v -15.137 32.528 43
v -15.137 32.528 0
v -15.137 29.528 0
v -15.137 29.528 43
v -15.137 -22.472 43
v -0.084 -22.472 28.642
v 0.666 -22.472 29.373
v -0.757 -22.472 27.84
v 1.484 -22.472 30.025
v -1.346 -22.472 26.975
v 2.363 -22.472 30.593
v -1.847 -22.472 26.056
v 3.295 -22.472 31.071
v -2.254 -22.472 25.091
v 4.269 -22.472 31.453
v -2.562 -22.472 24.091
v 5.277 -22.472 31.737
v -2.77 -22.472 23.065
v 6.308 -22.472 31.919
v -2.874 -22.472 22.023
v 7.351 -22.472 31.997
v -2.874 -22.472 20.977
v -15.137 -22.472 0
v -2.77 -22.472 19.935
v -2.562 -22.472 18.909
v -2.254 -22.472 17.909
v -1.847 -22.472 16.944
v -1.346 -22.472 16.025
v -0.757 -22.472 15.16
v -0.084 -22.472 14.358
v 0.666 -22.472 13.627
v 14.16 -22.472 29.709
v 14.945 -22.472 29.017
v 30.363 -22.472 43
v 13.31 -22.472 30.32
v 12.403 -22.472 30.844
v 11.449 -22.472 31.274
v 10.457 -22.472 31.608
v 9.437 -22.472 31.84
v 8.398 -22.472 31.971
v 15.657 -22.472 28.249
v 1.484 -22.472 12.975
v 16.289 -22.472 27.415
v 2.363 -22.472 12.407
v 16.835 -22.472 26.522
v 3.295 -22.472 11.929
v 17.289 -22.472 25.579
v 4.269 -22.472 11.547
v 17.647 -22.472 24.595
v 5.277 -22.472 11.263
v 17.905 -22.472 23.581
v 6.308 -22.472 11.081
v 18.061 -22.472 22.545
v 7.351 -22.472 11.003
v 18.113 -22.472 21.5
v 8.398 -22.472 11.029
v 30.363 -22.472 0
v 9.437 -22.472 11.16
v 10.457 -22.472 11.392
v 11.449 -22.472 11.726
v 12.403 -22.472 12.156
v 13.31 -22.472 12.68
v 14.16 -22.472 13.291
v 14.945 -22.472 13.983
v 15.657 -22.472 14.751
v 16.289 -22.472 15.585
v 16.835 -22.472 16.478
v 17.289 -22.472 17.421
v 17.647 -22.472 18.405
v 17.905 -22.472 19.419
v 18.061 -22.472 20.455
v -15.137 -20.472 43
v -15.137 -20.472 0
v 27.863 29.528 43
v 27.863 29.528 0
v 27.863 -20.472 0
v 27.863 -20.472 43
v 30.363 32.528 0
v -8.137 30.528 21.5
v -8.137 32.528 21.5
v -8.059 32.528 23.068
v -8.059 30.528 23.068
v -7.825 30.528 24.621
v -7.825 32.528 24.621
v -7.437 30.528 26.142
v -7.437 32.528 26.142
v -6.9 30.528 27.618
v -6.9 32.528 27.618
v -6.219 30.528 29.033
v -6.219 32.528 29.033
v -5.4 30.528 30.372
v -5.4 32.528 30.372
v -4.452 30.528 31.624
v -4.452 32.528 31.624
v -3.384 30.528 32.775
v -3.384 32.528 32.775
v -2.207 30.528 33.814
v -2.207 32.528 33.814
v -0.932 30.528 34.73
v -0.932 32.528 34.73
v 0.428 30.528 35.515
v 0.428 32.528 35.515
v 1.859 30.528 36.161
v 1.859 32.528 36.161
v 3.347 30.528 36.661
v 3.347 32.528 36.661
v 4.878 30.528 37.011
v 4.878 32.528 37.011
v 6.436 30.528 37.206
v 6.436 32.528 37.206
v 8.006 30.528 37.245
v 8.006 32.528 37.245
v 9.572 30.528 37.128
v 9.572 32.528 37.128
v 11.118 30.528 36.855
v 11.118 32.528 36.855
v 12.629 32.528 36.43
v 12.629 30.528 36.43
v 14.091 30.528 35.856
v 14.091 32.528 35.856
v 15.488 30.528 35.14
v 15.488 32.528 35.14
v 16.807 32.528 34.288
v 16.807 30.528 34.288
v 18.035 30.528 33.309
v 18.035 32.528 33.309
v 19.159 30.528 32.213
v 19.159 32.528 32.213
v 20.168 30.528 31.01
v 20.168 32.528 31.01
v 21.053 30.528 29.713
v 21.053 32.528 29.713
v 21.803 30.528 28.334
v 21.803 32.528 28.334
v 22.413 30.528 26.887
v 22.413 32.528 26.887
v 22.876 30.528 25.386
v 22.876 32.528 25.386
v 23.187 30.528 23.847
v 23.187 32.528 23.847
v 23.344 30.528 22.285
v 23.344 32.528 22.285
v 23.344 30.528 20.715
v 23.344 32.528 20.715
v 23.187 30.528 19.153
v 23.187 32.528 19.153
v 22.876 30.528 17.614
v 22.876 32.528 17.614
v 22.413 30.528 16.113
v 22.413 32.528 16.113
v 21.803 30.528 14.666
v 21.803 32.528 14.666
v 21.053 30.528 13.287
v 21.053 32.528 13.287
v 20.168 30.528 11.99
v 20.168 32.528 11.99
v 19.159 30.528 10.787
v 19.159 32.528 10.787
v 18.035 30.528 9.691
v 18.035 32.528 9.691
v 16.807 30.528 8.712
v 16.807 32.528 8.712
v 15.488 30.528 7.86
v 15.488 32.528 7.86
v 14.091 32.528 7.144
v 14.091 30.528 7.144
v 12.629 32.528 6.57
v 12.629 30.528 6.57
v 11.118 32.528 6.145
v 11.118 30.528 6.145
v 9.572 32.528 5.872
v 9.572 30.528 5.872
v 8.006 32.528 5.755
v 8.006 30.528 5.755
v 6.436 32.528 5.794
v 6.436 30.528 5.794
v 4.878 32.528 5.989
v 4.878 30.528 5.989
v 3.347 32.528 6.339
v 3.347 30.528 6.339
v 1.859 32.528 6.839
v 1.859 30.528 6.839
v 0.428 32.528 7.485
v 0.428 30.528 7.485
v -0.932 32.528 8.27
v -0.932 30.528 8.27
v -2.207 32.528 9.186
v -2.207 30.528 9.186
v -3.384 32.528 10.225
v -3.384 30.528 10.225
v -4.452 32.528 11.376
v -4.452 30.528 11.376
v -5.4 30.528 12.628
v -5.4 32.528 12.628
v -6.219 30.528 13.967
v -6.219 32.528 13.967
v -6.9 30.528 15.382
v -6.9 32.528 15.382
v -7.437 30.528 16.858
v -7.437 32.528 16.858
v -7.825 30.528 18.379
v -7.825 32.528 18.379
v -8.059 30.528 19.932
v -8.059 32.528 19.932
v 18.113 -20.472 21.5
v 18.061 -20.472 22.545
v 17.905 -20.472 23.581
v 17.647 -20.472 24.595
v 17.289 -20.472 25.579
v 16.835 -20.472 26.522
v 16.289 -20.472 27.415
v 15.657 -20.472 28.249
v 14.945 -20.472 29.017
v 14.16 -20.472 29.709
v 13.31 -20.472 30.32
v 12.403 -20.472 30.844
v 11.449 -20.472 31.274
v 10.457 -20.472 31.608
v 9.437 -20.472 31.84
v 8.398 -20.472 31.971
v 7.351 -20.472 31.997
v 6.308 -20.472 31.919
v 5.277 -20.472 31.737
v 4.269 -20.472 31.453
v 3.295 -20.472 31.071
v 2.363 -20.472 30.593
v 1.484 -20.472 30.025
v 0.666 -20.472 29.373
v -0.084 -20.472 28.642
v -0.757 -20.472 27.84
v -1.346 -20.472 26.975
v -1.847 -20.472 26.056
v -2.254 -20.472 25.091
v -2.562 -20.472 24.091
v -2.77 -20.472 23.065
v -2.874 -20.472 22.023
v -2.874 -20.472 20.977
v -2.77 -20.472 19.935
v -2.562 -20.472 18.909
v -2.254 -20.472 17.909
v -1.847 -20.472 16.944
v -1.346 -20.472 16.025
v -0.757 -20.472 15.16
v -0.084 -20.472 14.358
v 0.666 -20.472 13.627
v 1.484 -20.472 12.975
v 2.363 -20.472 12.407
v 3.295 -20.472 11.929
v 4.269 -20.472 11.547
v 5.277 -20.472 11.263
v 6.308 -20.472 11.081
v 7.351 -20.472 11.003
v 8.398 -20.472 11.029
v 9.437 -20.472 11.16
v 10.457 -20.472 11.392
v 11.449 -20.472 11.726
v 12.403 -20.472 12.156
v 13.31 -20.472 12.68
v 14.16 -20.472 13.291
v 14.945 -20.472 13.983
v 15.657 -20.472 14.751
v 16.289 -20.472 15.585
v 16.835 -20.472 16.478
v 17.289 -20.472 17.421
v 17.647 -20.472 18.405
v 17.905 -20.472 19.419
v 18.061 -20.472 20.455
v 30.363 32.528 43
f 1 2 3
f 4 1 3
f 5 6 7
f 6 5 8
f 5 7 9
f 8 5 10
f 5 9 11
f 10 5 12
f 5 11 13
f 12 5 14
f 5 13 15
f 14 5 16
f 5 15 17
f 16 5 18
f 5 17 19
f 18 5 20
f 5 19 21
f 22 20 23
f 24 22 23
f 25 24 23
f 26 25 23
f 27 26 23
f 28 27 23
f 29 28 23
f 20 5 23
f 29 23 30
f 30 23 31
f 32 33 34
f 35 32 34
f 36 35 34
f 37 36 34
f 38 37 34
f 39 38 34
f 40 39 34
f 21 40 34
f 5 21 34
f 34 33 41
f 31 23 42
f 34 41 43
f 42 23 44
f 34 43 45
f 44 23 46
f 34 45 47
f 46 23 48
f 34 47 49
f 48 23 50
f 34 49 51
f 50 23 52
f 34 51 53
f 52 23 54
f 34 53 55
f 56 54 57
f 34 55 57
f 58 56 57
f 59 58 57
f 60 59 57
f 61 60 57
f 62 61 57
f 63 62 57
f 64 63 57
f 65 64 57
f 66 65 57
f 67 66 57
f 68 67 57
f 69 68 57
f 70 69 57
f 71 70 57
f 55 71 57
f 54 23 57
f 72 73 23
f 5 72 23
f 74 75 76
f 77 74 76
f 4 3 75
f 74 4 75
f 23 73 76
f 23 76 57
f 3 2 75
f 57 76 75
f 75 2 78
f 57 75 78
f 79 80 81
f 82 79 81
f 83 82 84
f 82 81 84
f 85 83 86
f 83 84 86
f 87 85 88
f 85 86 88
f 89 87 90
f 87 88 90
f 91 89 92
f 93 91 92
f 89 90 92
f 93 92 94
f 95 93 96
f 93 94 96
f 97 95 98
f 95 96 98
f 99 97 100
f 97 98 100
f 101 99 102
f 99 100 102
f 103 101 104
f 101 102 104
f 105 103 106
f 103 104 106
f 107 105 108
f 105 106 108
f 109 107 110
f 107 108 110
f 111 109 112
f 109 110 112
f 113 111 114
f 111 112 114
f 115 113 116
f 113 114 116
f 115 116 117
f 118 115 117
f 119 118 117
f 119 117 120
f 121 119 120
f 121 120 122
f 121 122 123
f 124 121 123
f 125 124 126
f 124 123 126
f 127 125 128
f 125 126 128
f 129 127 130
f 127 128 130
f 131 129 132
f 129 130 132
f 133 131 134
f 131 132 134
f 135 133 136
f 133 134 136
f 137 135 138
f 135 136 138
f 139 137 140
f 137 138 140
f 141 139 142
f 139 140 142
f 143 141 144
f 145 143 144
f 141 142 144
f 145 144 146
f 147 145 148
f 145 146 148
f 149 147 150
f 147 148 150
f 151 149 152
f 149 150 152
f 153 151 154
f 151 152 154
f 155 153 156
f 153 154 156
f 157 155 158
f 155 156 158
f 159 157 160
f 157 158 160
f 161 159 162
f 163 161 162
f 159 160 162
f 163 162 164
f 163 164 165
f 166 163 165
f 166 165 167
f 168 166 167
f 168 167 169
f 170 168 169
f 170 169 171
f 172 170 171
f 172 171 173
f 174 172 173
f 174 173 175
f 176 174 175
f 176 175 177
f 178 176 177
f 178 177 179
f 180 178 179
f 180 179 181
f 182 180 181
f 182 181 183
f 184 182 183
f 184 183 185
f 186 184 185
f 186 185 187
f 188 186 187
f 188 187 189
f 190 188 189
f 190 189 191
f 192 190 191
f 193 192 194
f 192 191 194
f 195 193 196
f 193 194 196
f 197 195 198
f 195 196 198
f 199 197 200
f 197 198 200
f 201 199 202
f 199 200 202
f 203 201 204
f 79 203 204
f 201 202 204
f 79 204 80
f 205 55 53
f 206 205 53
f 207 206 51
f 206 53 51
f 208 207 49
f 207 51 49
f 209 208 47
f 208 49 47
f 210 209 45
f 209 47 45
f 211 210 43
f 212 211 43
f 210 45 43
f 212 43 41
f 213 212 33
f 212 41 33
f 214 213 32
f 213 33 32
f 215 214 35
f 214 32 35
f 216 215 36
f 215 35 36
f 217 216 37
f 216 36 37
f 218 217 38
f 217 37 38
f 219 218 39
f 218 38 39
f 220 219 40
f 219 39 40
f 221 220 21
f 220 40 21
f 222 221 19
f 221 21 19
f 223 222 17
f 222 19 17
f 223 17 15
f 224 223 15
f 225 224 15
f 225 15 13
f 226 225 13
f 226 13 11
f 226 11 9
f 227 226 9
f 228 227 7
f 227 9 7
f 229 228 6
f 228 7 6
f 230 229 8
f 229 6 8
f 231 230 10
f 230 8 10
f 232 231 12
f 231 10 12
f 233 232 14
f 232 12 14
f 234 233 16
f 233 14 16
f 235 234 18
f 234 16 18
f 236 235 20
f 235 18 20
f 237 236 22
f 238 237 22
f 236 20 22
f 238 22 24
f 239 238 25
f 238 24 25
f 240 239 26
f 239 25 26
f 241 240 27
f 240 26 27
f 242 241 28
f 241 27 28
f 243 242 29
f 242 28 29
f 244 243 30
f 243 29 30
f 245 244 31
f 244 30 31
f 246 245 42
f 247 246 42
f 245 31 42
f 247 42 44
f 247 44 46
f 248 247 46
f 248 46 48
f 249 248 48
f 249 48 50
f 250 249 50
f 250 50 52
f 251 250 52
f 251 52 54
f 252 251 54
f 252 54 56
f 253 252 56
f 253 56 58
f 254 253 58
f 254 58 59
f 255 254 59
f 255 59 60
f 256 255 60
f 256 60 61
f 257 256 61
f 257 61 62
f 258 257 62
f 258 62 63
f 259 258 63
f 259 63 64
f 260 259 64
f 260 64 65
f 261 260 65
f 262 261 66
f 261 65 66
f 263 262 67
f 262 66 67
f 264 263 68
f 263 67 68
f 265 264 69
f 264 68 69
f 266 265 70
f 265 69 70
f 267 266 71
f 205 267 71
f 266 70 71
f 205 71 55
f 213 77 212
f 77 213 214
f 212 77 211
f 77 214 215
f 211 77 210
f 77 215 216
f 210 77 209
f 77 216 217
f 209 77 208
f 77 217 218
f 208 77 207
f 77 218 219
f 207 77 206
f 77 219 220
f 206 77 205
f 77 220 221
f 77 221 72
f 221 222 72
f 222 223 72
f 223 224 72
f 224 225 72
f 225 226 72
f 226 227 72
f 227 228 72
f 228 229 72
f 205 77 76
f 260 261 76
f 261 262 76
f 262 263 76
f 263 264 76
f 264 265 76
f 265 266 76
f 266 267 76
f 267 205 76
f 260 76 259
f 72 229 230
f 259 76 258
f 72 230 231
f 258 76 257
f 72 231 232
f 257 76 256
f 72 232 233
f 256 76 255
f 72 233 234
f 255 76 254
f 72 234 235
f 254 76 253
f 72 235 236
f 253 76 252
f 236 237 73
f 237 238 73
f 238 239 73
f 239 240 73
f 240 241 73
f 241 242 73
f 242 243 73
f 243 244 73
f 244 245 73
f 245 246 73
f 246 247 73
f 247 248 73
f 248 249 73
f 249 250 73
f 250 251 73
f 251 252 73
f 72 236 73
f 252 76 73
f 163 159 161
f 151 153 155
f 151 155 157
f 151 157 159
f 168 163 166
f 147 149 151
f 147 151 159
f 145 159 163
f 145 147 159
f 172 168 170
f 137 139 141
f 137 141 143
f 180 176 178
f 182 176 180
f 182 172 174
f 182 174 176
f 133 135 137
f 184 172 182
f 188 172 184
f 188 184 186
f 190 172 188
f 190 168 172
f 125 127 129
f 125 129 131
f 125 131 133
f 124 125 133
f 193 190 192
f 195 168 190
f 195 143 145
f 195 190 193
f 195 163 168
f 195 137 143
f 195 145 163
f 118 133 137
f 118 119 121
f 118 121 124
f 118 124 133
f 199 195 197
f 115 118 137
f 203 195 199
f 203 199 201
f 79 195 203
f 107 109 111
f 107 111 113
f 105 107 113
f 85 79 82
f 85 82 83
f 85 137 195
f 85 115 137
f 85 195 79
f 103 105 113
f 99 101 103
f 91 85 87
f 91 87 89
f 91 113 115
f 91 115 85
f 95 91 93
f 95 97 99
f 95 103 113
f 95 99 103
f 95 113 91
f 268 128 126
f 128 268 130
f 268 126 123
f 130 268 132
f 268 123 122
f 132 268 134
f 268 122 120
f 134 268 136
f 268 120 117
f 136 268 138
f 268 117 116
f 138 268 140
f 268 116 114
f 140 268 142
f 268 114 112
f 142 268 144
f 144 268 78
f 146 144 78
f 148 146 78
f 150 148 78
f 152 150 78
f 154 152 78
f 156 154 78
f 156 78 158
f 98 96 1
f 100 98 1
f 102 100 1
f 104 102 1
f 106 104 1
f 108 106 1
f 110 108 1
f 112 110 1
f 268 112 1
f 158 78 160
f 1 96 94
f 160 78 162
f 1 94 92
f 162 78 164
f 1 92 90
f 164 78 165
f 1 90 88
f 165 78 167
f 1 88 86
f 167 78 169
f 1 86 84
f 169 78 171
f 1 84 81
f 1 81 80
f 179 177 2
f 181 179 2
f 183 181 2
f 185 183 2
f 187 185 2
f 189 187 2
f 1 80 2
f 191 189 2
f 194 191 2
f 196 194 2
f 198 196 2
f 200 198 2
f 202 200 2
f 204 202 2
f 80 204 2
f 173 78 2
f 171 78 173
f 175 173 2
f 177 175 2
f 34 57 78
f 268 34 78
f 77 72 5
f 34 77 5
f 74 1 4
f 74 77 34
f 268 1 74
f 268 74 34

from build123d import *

# Parameters (mm, degrees)
F1_DEPTH = 43
F2_R     = 10.5
F3_DEPTH = 2
F4_R     = 15.75
F5_DEPTH = 2


with BuildPart() as f1:
    # F0 (on Top) → F1 (new body)
    with BuildSketch(Plane.XY):
        Polygon((30.363204, 32.528415), (-15.136796, 32.528415), (-15.136796, 29.528415), (27.863204, 29.528415), (27.863204, -20.471585), (-15.136796, -20.471585), (-15.136796, -22.471585), (30.363204, -22.471585), align=None)
    extrude(amount=F1_DEPTH)

    # F2 (on face) → F3 (cut, through all)
    with BuildSketch(Plane.XZ.offset(22.471585)):
        with Locations((7.613204, 21.5)):
            Circle(F2_R)
    extrude(amount=-F3_DEPTH, mode=Mode.SUBTRACT)

    # F4 (on face) → F5 (cut)
    with BuildSketch(Plane(origin=(0, 32.528415, 0), x_dir=(-1, 0, 0), z_dir=(0, 1, 0))):
        with Locations((-7.613204, 21.5)):
            Circle(F4_R)
    extrude(amount=-F5_DEPTH, mode=Mode.SUBTRACT)


solid = f1.part
